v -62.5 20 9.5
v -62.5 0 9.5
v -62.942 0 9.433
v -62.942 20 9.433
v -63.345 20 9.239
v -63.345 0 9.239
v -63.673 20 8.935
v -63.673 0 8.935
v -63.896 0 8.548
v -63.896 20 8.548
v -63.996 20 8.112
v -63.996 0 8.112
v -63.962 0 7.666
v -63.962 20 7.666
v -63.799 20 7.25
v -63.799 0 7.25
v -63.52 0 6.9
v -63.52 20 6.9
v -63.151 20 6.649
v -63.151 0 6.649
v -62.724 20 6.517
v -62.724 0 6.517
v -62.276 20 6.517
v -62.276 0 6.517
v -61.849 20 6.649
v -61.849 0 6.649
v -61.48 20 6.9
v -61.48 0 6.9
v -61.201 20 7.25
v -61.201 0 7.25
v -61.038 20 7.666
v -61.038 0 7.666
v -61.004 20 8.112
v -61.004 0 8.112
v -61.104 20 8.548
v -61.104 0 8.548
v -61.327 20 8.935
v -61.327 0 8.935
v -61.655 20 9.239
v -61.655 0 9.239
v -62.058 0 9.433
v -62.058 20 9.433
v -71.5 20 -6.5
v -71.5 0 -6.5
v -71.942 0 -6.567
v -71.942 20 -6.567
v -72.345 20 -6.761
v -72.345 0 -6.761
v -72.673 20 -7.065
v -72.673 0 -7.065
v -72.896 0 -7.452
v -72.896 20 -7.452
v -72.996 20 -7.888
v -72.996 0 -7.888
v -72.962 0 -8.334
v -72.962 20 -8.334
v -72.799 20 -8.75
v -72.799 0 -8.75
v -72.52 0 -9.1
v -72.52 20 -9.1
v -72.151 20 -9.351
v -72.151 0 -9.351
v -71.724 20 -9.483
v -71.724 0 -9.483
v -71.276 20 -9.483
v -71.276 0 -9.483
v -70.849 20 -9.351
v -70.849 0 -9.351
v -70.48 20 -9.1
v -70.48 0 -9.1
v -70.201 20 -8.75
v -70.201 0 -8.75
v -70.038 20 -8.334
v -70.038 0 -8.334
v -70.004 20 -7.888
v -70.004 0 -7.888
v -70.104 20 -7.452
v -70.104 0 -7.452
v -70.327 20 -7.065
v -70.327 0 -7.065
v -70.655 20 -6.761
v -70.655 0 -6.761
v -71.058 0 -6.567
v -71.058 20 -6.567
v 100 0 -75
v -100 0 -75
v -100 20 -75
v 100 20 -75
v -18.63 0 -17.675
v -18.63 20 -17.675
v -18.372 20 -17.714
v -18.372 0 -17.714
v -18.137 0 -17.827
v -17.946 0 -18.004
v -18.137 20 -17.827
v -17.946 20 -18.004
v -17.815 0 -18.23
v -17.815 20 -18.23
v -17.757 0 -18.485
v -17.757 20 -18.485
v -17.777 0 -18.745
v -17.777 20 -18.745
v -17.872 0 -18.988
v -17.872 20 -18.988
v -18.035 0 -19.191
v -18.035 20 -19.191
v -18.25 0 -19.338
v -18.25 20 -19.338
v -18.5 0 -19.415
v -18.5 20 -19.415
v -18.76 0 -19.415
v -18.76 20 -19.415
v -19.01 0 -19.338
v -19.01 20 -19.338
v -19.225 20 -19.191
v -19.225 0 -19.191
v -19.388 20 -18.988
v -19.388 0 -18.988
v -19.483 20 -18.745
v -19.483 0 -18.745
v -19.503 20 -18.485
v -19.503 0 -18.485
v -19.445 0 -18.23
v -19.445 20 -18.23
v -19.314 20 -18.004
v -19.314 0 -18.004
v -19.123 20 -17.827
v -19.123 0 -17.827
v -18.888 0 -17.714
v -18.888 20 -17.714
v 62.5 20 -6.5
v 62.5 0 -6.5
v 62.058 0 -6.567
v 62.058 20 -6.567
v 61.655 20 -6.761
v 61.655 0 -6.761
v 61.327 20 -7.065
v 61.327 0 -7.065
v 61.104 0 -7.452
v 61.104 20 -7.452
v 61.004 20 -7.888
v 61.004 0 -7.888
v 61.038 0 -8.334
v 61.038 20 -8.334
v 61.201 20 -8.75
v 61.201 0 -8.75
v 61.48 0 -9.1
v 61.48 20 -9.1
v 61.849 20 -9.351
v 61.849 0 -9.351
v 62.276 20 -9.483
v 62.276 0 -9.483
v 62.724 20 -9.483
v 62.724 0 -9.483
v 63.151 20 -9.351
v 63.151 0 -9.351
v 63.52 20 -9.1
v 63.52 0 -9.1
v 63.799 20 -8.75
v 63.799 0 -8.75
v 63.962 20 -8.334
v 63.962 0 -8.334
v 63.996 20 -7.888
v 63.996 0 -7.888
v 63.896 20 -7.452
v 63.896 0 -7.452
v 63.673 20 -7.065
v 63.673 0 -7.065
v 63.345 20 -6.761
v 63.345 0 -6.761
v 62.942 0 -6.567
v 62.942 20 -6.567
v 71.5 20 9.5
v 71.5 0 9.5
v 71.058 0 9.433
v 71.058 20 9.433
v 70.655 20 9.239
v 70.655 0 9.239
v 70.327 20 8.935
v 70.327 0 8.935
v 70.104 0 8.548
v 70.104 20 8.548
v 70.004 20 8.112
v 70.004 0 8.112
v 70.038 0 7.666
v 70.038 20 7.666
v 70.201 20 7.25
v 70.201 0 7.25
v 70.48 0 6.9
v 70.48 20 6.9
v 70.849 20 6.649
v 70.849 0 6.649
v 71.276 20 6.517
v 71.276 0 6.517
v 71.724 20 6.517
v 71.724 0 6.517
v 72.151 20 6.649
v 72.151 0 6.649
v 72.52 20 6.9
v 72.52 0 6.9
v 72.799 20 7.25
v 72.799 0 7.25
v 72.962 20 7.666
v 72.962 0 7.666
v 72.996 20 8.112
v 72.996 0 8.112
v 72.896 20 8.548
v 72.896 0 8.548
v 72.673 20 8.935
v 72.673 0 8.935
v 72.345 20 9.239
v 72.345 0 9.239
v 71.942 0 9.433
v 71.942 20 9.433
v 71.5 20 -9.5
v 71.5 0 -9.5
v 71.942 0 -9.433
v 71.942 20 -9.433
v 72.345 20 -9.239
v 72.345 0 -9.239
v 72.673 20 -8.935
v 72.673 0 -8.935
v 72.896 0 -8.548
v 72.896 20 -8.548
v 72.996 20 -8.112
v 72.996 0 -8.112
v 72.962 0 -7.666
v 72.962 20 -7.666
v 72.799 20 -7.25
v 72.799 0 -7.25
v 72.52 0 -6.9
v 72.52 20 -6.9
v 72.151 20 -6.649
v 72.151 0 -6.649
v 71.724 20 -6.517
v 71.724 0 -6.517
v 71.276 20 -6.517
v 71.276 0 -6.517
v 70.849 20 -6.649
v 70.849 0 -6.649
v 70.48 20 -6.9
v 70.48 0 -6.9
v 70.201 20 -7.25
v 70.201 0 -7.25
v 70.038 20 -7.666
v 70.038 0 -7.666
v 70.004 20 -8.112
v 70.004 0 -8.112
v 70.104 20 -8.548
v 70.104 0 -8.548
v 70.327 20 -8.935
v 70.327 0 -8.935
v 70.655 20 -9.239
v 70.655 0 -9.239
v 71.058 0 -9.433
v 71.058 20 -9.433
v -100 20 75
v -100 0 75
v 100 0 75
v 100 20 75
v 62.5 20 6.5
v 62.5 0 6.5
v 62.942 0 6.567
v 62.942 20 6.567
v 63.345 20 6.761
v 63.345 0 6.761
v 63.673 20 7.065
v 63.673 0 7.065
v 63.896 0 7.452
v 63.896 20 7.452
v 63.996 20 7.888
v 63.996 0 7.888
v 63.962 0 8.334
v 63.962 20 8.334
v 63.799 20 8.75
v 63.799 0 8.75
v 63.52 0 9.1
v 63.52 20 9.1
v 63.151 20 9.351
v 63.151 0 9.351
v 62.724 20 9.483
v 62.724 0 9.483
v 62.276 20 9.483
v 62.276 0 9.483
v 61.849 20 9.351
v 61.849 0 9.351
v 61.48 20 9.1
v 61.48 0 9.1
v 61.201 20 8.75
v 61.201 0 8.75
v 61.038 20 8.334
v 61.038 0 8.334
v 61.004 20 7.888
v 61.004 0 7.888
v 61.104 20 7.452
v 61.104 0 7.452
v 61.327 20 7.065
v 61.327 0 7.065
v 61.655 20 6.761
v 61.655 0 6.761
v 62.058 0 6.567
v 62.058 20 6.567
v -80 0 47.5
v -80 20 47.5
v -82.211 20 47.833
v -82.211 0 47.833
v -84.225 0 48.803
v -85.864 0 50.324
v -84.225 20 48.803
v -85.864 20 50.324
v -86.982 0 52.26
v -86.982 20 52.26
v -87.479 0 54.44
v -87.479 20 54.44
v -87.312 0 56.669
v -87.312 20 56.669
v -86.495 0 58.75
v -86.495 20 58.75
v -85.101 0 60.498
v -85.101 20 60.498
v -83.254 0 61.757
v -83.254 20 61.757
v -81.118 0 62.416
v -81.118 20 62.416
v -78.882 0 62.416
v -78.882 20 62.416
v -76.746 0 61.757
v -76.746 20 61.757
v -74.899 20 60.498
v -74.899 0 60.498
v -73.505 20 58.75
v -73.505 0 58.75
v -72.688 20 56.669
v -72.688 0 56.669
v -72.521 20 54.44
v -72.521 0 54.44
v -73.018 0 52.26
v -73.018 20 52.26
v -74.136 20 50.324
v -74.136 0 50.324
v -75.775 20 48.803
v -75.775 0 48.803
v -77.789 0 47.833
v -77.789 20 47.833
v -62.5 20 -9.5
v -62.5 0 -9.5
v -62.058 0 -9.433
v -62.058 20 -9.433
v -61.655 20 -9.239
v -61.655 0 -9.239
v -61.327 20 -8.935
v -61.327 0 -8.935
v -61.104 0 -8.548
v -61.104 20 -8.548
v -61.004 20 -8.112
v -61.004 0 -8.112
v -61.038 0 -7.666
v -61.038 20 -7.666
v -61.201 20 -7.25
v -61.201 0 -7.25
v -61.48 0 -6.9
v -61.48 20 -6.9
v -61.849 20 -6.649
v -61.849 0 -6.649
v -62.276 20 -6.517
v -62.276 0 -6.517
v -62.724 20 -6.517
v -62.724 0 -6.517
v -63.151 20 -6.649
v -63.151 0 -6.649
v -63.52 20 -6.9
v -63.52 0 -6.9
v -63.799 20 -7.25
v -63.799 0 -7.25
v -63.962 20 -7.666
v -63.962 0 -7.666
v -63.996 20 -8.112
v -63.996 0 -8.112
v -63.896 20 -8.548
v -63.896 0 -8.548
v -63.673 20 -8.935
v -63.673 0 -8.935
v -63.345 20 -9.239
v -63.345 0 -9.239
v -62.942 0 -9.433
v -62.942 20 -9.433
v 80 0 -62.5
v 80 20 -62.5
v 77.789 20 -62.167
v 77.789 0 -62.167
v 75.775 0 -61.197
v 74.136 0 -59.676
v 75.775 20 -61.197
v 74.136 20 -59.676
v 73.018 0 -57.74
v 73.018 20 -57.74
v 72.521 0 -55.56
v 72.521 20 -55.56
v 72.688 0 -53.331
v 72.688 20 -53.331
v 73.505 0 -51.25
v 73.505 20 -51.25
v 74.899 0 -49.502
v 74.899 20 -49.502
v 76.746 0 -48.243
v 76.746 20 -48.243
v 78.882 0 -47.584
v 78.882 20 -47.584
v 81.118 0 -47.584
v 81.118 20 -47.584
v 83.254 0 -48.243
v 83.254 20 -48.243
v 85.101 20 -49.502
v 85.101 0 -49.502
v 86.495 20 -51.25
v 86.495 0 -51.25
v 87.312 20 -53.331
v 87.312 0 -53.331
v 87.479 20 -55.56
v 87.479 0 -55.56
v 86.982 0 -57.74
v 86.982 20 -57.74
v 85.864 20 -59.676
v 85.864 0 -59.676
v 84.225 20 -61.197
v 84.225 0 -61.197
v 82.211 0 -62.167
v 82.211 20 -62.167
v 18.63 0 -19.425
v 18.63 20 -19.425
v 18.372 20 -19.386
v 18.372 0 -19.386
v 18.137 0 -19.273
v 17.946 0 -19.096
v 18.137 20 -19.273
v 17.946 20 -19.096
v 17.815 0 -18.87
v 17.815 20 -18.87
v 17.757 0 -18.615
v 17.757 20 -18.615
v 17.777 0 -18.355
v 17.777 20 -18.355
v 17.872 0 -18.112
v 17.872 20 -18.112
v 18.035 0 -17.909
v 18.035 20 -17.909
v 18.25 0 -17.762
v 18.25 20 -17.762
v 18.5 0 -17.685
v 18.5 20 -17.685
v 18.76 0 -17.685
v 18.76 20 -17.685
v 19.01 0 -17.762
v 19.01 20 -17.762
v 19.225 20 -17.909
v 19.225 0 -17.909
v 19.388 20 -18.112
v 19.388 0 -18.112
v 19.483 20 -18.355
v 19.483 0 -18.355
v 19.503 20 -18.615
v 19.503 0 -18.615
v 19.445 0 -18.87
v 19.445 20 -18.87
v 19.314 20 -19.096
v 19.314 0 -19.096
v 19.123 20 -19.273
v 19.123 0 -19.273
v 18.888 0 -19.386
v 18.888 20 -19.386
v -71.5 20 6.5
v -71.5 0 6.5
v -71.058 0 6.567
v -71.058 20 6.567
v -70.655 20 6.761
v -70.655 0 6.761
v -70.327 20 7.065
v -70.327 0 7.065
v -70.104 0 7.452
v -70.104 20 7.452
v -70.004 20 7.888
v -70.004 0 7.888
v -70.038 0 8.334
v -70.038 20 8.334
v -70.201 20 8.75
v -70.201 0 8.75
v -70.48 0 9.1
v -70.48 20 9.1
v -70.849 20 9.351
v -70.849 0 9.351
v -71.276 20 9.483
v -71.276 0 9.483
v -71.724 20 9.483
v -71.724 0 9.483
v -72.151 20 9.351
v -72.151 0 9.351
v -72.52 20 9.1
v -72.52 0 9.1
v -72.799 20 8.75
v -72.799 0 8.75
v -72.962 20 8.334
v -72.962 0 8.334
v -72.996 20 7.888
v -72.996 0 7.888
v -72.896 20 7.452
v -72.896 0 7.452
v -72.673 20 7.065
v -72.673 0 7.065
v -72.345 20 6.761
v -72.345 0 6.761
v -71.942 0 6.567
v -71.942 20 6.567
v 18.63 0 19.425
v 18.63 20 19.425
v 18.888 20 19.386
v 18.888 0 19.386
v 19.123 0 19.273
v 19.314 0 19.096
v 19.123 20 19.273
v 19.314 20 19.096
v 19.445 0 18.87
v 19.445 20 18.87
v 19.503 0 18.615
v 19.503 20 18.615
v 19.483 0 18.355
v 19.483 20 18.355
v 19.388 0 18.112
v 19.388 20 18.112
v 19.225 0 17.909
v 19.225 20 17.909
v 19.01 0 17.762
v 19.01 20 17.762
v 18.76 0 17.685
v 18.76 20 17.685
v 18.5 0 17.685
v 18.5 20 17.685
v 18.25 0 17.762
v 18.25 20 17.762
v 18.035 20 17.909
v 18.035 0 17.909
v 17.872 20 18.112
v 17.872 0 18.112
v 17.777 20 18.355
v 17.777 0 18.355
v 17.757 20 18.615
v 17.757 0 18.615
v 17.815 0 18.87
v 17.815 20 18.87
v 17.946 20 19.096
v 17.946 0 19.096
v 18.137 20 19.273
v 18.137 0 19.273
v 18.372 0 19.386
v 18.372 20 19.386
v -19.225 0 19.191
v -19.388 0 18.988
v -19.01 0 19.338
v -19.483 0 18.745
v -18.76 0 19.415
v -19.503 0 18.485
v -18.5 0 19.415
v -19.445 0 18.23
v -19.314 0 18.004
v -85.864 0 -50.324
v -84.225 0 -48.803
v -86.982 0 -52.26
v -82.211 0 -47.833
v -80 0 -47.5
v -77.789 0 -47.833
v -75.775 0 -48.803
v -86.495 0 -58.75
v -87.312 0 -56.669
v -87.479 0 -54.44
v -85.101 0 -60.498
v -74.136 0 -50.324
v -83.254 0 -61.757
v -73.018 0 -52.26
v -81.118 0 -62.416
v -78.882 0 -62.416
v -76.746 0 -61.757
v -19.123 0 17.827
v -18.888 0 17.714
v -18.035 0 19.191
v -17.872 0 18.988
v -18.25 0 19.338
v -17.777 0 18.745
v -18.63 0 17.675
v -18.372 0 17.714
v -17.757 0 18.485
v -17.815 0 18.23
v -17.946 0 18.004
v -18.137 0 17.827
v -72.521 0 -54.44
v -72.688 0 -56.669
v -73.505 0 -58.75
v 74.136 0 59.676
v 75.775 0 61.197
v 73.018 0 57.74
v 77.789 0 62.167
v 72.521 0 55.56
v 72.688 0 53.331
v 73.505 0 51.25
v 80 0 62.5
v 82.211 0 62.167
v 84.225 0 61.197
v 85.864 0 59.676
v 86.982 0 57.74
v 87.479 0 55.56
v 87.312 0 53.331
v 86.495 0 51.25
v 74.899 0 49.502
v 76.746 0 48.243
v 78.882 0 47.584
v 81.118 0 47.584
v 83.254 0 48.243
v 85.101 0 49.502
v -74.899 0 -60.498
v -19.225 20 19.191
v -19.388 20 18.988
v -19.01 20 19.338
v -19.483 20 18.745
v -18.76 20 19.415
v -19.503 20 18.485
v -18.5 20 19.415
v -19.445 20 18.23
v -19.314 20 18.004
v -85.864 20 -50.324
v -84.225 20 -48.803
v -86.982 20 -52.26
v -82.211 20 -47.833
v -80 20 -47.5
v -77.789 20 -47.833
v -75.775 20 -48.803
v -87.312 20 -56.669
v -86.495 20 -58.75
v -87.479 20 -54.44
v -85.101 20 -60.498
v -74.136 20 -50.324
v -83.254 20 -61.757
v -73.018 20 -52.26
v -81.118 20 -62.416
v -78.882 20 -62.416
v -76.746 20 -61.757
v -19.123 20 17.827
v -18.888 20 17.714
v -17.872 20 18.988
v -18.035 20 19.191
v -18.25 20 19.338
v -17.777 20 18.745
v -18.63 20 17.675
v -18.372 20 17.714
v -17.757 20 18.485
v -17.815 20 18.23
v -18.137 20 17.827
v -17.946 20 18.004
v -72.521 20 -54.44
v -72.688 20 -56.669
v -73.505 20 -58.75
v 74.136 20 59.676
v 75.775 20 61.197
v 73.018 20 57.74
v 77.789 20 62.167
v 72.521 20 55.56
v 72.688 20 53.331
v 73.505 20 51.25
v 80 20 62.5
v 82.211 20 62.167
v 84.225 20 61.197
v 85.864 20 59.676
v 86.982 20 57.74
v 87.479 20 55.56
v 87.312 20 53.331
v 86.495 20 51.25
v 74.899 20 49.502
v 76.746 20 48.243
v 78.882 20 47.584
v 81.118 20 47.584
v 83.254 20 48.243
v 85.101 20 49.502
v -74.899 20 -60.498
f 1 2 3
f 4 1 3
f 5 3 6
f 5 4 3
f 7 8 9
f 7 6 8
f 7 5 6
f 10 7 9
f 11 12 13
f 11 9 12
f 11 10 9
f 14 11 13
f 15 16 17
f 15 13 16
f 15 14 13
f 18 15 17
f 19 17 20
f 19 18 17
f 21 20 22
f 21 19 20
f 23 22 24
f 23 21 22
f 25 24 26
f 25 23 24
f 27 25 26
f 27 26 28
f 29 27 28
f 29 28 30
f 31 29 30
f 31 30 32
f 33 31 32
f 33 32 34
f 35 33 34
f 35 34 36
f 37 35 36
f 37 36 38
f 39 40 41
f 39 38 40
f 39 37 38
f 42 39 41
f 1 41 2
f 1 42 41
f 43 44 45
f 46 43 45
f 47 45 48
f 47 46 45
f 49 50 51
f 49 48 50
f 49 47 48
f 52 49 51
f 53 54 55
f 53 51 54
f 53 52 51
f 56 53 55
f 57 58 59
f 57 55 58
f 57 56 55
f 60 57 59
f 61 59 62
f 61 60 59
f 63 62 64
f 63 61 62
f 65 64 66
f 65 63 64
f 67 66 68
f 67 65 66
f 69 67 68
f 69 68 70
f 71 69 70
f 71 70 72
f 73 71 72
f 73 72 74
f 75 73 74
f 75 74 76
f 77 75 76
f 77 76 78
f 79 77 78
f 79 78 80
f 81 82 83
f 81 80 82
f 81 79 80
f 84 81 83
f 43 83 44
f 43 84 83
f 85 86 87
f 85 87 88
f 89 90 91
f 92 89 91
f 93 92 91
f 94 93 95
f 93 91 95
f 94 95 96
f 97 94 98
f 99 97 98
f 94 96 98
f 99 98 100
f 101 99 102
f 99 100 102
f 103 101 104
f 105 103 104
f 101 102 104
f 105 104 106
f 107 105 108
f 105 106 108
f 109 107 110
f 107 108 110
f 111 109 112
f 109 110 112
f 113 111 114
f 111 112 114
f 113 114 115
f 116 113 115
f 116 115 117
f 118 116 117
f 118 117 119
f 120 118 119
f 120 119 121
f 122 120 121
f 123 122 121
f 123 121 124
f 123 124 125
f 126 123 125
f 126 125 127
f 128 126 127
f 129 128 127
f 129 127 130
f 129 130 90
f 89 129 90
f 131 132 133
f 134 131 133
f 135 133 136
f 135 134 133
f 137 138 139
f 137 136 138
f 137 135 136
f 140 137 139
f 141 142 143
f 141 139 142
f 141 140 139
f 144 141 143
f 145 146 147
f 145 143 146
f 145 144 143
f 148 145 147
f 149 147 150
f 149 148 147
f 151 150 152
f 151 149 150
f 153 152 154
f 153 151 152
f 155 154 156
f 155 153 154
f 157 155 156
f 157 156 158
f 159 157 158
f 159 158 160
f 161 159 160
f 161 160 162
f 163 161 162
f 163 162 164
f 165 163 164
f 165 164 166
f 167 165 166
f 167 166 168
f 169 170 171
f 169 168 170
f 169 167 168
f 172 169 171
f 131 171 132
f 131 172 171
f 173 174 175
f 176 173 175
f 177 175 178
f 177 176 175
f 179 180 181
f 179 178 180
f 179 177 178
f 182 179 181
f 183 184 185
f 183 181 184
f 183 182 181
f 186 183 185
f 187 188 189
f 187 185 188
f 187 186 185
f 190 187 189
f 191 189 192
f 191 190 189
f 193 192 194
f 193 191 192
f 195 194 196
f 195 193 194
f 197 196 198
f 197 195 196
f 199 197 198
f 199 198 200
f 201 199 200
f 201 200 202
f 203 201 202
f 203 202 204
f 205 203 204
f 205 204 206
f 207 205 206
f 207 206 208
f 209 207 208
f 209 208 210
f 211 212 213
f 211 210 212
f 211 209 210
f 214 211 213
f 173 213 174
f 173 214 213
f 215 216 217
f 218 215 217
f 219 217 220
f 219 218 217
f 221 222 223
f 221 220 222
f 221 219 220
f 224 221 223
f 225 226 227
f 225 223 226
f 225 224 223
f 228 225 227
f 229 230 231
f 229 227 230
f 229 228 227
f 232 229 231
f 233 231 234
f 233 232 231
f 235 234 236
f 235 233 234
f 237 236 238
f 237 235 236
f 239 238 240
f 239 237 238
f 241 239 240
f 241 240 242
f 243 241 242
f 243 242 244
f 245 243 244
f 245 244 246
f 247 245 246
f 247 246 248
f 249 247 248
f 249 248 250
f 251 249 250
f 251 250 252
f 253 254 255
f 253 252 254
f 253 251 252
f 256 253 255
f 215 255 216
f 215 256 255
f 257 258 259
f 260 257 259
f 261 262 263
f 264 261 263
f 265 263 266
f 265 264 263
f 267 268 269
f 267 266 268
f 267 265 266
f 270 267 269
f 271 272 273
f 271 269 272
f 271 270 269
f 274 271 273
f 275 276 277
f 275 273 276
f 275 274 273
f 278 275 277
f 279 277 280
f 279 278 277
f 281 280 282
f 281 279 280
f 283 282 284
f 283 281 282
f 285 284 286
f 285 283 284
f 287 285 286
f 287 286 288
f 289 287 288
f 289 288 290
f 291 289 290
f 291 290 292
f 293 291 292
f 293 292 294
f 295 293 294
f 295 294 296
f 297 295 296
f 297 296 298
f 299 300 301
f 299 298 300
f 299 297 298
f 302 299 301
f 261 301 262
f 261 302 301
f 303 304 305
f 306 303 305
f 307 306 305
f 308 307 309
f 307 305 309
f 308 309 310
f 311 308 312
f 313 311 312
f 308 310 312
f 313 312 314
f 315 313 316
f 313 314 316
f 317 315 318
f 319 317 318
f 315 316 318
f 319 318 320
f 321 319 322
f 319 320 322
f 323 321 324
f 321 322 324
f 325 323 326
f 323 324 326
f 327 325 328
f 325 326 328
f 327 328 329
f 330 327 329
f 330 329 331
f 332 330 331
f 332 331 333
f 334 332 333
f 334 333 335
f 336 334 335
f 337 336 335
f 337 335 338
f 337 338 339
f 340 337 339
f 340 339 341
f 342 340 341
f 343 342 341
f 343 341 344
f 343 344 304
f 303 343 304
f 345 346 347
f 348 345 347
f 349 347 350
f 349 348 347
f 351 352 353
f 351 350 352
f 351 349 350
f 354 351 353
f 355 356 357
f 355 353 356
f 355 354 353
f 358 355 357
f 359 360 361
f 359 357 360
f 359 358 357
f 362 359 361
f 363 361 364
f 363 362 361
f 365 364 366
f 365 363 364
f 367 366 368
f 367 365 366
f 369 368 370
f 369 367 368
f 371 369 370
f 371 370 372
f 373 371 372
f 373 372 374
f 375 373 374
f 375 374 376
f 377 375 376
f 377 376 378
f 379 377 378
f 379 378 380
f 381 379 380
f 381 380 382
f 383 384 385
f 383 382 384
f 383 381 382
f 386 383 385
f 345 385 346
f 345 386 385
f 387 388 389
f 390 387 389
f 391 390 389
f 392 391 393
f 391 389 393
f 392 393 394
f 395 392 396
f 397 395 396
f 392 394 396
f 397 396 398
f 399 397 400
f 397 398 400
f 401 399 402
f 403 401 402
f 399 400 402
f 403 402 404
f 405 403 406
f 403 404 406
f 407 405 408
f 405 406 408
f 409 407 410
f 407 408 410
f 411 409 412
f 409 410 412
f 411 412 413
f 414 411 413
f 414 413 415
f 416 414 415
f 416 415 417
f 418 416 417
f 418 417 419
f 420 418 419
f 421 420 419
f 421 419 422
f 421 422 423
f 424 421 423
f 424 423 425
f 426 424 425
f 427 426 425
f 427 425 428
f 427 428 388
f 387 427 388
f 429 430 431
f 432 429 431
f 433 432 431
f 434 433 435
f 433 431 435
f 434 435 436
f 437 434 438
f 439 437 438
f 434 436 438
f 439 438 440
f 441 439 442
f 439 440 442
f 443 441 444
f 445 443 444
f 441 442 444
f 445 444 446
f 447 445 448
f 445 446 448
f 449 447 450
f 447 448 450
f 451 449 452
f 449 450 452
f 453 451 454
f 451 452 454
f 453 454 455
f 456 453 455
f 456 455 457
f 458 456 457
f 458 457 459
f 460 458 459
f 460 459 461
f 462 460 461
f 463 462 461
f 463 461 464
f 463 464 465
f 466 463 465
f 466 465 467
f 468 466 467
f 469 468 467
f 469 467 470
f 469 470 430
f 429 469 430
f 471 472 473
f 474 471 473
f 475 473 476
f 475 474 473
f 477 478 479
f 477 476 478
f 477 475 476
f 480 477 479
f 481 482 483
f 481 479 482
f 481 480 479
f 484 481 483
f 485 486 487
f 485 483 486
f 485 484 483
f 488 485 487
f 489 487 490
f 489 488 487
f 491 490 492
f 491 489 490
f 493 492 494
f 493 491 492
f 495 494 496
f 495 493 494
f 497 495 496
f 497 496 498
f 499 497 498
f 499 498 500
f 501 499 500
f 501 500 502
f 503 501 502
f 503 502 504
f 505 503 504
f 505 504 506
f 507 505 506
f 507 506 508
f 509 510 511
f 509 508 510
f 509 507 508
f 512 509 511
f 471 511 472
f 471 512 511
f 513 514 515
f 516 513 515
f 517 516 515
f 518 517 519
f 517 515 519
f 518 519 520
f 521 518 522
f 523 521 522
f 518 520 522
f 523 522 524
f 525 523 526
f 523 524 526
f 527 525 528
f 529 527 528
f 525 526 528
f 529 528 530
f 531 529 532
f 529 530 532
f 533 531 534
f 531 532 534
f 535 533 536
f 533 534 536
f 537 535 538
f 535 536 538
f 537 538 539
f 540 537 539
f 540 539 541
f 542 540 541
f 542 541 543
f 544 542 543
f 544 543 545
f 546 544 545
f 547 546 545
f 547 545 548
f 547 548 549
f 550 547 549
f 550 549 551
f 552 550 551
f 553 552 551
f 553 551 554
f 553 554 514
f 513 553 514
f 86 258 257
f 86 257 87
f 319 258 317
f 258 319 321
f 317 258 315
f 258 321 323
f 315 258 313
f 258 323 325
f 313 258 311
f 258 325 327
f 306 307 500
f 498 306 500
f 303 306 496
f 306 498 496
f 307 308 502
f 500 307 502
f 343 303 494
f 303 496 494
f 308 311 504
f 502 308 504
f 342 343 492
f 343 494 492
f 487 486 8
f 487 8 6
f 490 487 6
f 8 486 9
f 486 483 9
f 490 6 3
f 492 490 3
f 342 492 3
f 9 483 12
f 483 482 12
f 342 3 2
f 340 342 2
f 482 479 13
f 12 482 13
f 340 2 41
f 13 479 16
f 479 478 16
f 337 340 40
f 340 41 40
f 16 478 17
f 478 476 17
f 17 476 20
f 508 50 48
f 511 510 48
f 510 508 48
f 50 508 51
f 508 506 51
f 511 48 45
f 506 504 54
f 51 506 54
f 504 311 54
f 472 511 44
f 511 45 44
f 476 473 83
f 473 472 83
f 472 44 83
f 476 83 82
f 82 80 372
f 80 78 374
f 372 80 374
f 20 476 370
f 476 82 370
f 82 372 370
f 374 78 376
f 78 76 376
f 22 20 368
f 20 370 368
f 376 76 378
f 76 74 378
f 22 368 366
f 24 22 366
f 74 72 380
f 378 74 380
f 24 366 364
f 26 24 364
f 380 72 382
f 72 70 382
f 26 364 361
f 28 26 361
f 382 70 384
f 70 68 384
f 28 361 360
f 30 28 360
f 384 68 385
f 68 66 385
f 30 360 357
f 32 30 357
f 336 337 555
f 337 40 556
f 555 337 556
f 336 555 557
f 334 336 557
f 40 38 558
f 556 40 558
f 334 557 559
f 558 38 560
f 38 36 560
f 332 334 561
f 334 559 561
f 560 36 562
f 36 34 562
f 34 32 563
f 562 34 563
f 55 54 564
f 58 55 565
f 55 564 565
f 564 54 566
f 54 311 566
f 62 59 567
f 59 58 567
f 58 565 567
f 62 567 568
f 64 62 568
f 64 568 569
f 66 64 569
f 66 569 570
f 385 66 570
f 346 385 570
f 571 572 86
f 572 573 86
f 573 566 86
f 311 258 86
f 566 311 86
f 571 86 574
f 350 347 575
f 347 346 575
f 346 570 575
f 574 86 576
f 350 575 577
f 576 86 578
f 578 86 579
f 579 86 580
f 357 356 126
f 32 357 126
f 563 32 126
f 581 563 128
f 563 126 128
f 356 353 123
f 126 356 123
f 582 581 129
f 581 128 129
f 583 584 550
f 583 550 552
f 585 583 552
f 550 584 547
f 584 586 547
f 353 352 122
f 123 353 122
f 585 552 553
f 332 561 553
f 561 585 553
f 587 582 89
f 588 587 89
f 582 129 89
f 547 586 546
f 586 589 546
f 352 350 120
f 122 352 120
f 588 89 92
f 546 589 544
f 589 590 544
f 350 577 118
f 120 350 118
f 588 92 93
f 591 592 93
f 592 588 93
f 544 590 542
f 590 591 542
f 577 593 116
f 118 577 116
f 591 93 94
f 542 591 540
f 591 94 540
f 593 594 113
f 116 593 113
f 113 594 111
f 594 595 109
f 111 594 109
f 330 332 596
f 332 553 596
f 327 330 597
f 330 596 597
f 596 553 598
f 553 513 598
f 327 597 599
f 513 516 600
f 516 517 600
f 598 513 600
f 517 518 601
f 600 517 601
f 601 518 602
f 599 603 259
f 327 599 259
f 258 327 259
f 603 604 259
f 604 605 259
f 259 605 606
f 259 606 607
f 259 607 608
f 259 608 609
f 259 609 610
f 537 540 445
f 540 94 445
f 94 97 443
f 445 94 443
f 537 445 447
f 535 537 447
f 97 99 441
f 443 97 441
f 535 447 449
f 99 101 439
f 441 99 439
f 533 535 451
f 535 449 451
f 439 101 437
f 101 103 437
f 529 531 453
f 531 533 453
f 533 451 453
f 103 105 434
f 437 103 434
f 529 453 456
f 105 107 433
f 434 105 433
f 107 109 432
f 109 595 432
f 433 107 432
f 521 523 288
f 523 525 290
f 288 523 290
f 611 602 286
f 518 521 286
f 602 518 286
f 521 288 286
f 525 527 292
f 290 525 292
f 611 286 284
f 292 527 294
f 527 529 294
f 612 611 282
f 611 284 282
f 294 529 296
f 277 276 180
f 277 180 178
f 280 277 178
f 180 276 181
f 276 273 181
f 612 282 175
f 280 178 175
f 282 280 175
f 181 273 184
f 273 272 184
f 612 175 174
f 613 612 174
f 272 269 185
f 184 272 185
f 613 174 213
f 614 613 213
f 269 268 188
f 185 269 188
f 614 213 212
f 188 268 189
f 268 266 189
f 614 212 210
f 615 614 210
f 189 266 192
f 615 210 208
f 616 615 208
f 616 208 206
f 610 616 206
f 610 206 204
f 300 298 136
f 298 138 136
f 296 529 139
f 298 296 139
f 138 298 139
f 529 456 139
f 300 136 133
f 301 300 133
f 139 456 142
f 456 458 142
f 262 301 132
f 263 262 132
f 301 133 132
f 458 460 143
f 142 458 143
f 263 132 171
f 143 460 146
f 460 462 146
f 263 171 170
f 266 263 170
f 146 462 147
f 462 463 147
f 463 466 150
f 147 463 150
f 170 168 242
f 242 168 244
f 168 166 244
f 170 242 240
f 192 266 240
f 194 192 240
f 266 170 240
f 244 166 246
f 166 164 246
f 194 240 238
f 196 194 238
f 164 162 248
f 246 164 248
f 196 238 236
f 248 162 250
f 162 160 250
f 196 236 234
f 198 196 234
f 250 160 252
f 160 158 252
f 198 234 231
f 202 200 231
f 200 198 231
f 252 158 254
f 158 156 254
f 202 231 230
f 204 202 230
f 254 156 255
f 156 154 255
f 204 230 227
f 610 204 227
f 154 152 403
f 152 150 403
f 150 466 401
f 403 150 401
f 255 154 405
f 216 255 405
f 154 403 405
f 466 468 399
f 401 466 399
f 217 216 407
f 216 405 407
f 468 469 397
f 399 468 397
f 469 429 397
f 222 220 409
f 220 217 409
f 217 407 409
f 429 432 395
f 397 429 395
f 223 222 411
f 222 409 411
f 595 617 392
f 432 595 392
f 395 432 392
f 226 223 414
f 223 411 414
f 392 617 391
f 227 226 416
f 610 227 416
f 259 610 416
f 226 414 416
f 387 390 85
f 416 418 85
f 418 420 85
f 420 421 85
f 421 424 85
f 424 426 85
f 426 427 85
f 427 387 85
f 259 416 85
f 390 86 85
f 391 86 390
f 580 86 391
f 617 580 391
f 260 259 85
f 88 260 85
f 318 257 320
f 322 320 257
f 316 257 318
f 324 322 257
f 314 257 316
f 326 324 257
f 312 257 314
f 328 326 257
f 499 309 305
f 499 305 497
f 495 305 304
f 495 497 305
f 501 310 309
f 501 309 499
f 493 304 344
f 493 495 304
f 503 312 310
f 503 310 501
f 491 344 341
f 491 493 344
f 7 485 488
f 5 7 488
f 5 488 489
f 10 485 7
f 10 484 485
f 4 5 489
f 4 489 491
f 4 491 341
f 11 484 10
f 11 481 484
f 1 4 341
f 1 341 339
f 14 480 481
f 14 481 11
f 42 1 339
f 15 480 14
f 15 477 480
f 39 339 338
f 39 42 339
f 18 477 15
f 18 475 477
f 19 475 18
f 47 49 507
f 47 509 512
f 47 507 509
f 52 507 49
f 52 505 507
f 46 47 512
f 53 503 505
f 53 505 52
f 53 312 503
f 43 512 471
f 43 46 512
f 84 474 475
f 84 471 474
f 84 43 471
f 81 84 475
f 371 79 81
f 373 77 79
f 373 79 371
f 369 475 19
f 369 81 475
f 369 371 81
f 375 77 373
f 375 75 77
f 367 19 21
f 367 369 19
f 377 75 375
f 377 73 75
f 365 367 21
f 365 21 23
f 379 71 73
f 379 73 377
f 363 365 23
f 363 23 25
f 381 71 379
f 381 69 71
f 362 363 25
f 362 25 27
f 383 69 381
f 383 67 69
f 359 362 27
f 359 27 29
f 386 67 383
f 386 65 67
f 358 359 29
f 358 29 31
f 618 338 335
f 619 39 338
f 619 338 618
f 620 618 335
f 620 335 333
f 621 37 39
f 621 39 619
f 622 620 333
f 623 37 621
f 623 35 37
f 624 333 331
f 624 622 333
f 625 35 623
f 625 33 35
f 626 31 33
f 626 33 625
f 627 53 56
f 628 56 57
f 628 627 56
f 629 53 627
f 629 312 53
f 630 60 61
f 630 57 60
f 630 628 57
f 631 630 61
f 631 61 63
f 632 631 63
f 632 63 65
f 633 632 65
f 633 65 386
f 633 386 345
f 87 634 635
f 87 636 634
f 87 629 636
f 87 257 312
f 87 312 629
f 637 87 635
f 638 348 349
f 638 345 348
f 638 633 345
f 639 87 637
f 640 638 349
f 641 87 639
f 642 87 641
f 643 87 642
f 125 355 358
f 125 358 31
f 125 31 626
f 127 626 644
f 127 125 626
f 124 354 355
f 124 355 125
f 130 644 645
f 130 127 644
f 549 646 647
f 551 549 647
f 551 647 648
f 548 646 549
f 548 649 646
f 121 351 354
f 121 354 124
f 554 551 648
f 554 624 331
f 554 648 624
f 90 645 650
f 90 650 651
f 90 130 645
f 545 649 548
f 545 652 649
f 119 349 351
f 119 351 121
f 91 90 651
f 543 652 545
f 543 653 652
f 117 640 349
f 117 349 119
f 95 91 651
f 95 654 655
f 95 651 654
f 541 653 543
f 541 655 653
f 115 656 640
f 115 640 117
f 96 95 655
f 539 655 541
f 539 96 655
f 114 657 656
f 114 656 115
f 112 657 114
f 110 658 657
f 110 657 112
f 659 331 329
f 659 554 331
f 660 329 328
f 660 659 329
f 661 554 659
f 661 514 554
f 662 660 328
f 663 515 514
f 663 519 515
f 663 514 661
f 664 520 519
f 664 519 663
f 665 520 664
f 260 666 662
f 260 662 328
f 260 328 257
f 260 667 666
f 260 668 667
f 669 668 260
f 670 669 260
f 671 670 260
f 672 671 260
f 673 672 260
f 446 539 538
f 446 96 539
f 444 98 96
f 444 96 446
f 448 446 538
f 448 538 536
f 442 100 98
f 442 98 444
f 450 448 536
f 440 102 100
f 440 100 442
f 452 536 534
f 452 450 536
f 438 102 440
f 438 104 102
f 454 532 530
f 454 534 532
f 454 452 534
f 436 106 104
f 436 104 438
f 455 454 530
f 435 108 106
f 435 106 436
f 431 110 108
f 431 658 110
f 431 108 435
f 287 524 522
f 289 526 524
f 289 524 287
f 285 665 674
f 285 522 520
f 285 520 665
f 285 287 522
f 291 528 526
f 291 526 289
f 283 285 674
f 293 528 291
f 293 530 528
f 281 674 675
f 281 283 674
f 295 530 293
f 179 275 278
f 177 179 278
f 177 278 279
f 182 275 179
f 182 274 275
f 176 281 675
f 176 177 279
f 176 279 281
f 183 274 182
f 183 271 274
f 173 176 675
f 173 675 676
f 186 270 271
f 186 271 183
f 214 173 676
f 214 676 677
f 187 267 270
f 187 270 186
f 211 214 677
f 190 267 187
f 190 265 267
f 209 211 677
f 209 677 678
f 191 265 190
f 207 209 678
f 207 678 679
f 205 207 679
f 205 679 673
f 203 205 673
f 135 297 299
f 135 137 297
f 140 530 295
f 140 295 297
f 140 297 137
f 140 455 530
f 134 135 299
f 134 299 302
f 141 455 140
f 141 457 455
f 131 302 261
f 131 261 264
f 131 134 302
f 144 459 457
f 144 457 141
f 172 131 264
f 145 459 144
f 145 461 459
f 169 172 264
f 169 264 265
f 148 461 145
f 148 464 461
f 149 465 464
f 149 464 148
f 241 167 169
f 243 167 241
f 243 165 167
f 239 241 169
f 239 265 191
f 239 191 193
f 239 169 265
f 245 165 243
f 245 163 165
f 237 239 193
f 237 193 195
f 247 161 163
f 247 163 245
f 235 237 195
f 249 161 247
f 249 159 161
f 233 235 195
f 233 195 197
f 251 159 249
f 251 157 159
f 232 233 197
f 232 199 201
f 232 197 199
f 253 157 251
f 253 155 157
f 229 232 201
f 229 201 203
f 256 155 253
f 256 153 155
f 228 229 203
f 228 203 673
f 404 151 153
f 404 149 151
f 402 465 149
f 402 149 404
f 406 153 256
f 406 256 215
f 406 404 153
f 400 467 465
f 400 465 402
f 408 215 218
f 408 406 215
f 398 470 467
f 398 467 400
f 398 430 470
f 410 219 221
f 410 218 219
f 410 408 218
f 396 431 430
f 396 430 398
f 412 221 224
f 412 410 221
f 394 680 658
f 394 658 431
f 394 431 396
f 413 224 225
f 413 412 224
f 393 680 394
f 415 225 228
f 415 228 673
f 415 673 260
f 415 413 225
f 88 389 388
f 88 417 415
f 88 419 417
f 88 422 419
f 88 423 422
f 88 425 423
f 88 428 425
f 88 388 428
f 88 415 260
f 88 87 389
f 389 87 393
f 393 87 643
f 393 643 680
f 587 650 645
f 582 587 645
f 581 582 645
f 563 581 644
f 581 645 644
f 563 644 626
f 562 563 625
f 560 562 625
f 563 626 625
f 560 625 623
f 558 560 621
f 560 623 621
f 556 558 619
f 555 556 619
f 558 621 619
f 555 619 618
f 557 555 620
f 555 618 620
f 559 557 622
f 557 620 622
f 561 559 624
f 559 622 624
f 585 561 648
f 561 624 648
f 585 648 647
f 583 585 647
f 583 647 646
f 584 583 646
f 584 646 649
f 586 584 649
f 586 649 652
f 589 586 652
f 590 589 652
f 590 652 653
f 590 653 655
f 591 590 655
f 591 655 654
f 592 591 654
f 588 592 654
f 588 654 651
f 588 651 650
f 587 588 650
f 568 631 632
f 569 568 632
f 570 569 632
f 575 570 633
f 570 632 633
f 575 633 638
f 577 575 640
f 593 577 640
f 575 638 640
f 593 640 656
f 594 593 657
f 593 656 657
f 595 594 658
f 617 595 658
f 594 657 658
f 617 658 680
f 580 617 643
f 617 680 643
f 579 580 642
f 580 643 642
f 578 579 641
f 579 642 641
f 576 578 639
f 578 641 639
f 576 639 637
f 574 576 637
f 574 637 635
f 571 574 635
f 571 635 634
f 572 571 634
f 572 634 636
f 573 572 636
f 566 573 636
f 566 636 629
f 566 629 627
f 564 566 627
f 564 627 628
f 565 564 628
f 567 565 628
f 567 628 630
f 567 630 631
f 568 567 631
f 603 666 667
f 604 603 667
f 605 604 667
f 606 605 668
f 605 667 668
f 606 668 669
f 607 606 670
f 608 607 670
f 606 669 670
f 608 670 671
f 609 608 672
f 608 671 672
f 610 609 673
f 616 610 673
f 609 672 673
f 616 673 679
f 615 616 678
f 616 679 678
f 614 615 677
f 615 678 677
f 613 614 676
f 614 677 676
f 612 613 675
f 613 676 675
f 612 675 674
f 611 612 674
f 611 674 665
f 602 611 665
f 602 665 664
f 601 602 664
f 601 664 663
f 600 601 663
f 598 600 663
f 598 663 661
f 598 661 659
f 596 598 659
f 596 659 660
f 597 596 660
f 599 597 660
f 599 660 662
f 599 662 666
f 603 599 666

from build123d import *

# Parameters (mm, degrees)
SKETCH1_W               = 200
SKETCH1_H               = 150
BOSS_EXTRUDE1_DEPTH     = 20
SKETCH2_R               = 7.5
CUT_EXTRUDE1_DEPTH      = 127.589889012
CUT_EXTRUDE2_DEPTH      = 127.589889012
CUT_EXTRUDE2_DEPTH_BACK = 127.589889012
SKETCH3_R               = 1.5
SKETCH4_R               = 0.875
CUT_EXTRUDE3_DEPTH      = 127.589889012


with BuildPart() as part:
    # Sketch1 → Boss-Extrude1 (new body)
    with BuildSketch(Plane(origin=(0, 0, 0), x_dir=(1, 0, 0), z_dir=(0, 1, 0))):
        Rectangle(SKETCH1_W, SKETCH1_H)
    extrude(amount=BOSS_EXTRUDE1_DEPTH)

    # Sketch2 → Cut-Extrude1 (cut, through all)
    with BuildSketch(Plane(origin=(0, 20, 0), x_dir=(1, 0, 0), z_dir=(0, 1, 0))):
        with Locations(Location((-80, 55, 0), (0, 0, 270))):
            Circle(SKETCH2_R)
        with Locations(Location((80, 55, 0), (0, 0, 90))):
            Circle(SKETCH2_R)
        with Locations(Location((-80, -55, 0), (0, 0, 90))):
            Circle(SKETCH2_R)
        with Locations(Location((80, -55, 0), (0, 0, 270))):
            Circle(SKETCH2_R)
    extrude(amount=-CUT_EXTRUDE1_DEPTH, mode=Mode.SUBTRACT)

    # Sketch3 → Cut-Extrude2 (cut, two sides: drawn at the far end of the back side and taken through both)
    with BuildSketch(Plane.XZ.offset(-CUT_EXTRUDE2_DEPTH_BACK)):
        with Locations(Location((-71.5, 8, 0), (0, 0, 270))):
            Circle(SKETCH3_R)
        with Locations(Location((-62.5, 8, 0), (0, 0, 90))):
            Circle(SKETCH3_R)
        with Locations(Location((-62.5, -8, 0), (0, 0, 270))):
            Circle(SKETCH3_R)
        with Locations(Location((-71.5, -8, 0), (0, 0, 90))):
            Circle(SKETCH3_R)
        with Locations(Location((62.5, -8, 0), (0, 0, 90))):
            Circle(SKETCH3_R)
        with Locations(Location((71.5, -8, 0), (0, 0, 270))):
            Circle(SKETCH3_R)
        with Locations(Location((62.5, 8, 0), (0, 0, 270))):
            Circle(SKETCH3_R)
        with Locations(Location((71.5, 8, 0), (0, 0, 90))):
            Circle(SKETCH3_R)
    extrude(amount=CUT_EXTRUDE2_DEPTH + CUT_EXTRUDE2_DEPTH_BACK, mode=Mode.SUBTRACT)

    # Sketch4 → Cut-Extrude3 (cut, through all)
    with BuildSketch(Plane(origin=(0, 20, 0), x_dir=(1, 0, 0), z_dir=(0, 1, 0))):
        with Locations(Location((-18.63, 18.55, 0), (0, 0, 270))):
            Circle(SKETCH4_R)
        with Locations(Location((18.63, 18.55, 0), (0, 0, 90))):
            Circle(SKETCH4_R)
        with Locations(Location((-18.63, -18.55, 0), (0, 0, 90))):
            Circle(SKETCH4_R)
        with Locations(Location((18.63, -18.55, 0), (0, 0, 270))):
            Circle(SKETCH4_R)
    extrude(amount=-CUT_EXTRUDE3_DEPTH, mode=Mode.SUBTRACT)


solid = part.part
